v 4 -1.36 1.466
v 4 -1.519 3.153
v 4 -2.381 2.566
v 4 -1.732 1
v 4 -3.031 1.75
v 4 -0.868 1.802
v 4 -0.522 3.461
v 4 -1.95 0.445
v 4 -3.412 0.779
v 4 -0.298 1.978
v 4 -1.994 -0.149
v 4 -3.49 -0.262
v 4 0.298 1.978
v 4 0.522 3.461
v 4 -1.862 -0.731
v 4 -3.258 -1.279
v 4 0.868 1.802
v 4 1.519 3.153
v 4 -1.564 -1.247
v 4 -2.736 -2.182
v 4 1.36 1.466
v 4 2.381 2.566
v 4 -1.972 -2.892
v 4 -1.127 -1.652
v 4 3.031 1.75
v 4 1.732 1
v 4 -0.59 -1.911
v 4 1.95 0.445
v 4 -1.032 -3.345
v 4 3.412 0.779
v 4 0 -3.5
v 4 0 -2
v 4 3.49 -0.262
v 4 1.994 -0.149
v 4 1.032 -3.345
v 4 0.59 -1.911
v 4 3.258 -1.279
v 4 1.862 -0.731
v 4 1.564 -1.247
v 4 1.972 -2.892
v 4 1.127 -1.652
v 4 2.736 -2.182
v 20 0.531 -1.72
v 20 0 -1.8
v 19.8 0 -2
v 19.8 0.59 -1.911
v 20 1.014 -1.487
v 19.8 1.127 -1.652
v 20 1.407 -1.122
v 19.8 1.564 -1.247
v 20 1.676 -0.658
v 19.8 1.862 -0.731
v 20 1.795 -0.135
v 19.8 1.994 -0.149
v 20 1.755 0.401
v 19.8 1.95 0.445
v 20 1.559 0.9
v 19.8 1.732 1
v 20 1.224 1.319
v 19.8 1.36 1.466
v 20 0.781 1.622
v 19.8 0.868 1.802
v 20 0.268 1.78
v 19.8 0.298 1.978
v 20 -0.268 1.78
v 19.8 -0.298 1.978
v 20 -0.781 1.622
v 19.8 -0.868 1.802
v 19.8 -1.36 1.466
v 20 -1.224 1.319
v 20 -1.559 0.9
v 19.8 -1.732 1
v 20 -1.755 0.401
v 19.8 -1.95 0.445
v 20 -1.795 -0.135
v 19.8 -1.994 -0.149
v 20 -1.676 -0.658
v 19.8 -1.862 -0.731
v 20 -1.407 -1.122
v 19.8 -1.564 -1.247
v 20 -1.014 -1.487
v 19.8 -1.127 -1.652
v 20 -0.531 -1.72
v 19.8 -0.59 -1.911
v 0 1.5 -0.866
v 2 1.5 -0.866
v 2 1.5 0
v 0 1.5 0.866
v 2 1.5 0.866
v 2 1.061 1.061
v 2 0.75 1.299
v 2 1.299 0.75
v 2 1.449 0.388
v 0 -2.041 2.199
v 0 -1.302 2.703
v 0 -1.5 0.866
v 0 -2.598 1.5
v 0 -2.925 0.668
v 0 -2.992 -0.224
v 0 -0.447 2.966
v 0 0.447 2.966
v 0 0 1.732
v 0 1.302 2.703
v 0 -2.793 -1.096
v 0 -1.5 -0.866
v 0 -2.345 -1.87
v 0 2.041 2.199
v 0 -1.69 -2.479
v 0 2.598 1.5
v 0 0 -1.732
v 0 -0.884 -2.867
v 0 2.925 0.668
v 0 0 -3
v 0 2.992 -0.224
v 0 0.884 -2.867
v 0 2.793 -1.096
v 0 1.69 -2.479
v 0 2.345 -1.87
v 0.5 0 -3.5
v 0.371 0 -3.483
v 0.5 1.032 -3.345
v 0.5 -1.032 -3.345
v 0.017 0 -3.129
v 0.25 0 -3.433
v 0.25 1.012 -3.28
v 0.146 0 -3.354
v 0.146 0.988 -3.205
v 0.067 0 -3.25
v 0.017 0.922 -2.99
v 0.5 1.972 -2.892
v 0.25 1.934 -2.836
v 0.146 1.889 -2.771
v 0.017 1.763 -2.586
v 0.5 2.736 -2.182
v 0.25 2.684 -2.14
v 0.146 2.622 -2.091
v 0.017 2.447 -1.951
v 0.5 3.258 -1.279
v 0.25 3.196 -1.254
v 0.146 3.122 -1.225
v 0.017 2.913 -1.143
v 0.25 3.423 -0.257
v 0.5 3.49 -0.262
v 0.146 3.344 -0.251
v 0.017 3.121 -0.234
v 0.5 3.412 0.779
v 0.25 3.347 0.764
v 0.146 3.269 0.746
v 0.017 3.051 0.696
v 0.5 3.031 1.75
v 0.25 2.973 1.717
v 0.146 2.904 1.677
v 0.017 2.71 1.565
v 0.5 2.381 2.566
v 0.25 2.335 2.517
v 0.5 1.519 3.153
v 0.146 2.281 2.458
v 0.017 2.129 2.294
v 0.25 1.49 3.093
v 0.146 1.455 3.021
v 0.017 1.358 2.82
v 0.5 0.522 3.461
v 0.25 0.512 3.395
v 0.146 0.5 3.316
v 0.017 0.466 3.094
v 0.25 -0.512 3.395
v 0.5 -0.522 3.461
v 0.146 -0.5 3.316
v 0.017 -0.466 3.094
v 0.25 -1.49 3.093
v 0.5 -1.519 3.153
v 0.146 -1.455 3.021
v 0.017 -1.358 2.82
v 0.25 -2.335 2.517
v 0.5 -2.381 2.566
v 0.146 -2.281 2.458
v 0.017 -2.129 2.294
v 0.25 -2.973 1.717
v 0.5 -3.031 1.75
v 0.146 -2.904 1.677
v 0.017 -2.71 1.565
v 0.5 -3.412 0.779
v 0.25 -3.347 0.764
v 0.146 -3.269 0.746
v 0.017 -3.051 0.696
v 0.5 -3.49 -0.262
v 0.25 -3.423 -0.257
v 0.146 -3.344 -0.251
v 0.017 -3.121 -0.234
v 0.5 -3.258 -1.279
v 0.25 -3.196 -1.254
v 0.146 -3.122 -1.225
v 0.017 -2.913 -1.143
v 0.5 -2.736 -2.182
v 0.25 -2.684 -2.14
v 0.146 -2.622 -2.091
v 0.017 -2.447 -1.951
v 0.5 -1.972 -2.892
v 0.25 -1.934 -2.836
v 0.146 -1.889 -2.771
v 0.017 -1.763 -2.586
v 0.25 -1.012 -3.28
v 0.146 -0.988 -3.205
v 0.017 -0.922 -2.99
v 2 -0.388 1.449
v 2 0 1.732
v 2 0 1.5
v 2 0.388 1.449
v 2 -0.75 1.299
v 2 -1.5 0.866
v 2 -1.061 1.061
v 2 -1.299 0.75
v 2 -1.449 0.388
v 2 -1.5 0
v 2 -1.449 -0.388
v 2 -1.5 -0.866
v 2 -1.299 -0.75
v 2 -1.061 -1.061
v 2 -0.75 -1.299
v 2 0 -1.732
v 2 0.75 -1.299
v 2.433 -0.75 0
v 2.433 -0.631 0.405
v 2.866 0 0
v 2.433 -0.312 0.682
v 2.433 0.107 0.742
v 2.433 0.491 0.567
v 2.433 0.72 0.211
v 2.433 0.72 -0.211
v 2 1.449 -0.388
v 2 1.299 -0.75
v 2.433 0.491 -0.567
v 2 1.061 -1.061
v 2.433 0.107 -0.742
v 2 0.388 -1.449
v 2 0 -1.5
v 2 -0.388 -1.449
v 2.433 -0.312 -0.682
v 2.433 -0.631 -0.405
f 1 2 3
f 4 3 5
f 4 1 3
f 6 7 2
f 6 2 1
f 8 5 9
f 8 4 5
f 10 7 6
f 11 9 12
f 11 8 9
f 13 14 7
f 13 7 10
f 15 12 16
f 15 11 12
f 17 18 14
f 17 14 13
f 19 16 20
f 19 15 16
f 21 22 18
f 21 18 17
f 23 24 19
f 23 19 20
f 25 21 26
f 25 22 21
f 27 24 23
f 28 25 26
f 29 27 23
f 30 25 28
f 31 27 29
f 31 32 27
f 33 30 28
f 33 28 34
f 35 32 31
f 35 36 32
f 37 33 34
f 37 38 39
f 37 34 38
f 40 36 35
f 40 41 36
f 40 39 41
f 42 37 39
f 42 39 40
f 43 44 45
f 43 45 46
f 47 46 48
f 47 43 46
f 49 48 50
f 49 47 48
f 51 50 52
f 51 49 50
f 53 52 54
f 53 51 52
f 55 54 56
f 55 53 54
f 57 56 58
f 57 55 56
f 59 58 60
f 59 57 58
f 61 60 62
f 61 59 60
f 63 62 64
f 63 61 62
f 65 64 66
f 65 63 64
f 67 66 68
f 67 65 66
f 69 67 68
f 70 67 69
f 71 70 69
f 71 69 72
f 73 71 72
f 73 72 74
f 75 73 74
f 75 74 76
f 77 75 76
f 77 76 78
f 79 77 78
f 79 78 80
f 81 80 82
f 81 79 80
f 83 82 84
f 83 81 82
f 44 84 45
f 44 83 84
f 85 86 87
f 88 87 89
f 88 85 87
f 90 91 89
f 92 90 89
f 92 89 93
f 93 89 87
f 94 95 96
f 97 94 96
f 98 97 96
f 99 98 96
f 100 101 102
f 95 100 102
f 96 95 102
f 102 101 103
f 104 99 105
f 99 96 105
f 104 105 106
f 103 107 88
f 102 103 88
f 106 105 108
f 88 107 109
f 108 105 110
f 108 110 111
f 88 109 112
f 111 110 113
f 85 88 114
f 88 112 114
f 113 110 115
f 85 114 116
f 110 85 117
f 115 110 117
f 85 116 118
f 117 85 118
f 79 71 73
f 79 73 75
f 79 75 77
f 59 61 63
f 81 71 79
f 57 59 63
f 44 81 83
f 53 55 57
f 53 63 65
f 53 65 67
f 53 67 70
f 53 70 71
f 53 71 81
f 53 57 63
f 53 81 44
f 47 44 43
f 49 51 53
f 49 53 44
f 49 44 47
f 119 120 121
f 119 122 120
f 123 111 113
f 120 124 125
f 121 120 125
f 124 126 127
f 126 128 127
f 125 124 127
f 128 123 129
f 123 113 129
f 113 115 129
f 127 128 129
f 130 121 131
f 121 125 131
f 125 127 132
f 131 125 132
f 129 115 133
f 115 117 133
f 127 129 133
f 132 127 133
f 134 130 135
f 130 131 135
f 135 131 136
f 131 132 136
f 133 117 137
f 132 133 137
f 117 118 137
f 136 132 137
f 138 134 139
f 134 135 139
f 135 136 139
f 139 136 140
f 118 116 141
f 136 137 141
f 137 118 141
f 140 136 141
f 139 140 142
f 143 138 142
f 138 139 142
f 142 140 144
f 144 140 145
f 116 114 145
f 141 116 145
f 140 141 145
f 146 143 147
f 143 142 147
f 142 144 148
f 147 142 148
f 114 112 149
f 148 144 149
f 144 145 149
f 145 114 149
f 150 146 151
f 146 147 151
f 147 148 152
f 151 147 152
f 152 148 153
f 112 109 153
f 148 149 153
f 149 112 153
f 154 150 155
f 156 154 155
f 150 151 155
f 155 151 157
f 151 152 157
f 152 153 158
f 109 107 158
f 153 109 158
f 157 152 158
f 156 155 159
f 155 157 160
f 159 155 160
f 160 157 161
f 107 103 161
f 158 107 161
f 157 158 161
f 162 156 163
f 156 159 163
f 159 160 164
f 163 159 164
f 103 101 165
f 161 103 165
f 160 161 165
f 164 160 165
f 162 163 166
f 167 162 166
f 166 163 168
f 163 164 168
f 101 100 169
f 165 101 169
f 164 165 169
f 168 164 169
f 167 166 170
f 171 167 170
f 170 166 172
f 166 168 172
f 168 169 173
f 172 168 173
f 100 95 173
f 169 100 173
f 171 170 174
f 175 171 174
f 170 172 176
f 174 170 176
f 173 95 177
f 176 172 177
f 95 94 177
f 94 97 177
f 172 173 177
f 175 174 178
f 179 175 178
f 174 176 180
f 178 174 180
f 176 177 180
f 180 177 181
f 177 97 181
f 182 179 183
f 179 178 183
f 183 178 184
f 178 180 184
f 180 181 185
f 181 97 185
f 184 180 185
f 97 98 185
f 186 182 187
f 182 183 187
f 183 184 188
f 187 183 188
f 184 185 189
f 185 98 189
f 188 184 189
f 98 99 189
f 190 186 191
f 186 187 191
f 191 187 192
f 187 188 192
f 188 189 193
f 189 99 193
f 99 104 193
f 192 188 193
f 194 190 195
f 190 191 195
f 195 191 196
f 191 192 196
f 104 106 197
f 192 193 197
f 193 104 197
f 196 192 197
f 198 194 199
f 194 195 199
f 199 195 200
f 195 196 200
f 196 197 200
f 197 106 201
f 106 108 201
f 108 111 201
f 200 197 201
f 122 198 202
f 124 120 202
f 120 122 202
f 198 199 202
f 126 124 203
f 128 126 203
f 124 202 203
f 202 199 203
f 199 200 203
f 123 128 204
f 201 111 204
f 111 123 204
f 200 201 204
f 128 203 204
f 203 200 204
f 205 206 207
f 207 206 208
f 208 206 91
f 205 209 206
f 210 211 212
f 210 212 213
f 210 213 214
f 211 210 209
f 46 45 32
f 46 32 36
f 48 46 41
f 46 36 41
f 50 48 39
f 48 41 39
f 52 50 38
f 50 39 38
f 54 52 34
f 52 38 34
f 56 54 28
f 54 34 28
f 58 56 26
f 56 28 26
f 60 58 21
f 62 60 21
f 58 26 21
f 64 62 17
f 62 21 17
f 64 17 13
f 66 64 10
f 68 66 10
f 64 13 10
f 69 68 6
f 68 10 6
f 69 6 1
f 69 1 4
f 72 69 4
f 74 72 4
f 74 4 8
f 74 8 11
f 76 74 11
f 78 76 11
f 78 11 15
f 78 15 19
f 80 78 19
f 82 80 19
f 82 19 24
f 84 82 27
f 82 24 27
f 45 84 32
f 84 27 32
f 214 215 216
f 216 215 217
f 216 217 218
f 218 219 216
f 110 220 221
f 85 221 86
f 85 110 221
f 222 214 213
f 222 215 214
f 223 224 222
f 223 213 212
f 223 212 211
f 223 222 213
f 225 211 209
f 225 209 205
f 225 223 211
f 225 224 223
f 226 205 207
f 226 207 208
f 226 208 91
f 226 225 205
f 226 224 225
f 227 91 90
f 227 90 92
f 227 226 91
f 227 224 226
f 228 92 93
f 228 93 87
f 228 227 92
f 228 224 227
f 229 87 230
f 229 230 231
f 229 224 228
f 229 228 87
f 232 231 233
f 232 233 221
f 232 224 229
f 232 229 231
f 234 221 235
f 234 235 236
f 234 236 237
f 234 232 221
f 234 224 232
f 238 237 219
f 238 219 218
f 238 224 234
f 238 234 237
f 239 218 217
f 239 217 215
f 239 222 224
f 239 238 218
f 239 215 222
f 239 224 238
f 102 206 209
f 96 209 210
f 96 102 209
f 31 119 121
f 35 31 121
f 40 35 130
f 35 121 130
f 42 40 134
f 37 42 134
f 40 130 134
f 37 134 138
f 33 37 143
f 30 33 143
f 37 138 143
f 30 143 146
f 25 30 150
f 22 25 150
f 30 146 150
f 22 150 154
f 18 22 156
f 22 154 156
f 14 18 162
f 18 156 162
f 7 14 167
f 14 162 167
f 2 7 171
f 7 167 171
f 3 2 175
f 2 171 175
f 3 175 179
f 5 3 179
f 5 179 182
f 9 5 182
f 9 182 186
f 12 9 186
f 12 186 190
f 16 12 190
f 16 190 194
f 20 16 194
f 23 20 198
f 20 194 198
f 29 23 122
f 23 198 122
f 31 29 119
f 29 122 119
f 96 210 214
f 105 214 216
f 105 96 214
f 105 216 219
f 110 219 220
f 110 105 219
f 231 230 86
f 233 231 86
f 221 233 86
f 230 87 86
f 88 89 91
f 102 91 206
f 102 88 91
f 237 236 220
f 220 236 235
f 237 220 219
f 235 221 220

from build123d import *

# Parameters (mm, degrees)
SKETCH1_R           = 3.5
BASEHEAD_DEPTH      = 4
SKETCH2_R           = 2
BASEBODY_DEPTH      = 16
HEXAGONSOCKET_DEPTH = 2
TOPFILLET_R         = 0.5
CHAMFER1_SIZE       = 0.2


with BuildPart() as part:
    # Sketch1 → BaseHead (new body)
    with BuildSketch(Plane(origin=(0, 0, 0), x_dir=(0, 0, -1), z_dir=(1, 0, 0))):
        Circle(SKETCH1_R)
    extrude(amount=BASEHEAD_DEPTH)

    # Sketch2 → BaseBody (add)
    with BuildSketch(Plane(origin=(4, 0, 0), x_dir=(0, 0, -1), z_dir=(1, 0, 0))):
        Circle(SKETCH2_R)
    extrude(amount=BASEBODY_DEPTH)

    # Sketch3 → HexagonSocket (cut)
    with BuildSketch(Plane(origin=(0, 0, 0), x_dir=(0, 0, -1), z_dir=(1, 0, 0))):
        Polygon((1.732050808, 0), (0.866025404, 1.5), (-0.866025404, 1.5), (-1.732050808, 0), (-0.866025404, -1.5), (0.866025404, -1.5), align=None)
    extrude(amount=HEXAGONSOCKET_DEPTH, mode=Mode.SUBTRACT)

    # Sketch4 → Cut-Revolve1 (revolve, cut)
    with BuildSketch(Plane(origin=(-4.19613823, 0.75, 0), x_dir=(-1, 0, 0), z_dir=(0, 0, 1))):
        Polygon((-6.19613823, 2.25), (-7.062163633, 0.75), (-6.19613823, 0.75), align=None)
    revolve(axis=Axis((0.838992387, 0, 0), (-1, 0, 0)), mode=Mode.SUBTRACT)

    # TopFillet
    topfillet_edges = [part.edges().sort_by_distance(p)[0] for p in [
        (0, 0, 3.5),
    ]]
    fillet(topfillet_edges, radius=TOPFILLET_R)

    # Chamfer1
    chamfer1_edges = [part.edges().sort_by_distance(p)[0] for p in [
        (20, 0, 2),
    ]]
    chamfer(chamfer1_edges, length=CHAMFER1_SIZE)


solid = part.part
